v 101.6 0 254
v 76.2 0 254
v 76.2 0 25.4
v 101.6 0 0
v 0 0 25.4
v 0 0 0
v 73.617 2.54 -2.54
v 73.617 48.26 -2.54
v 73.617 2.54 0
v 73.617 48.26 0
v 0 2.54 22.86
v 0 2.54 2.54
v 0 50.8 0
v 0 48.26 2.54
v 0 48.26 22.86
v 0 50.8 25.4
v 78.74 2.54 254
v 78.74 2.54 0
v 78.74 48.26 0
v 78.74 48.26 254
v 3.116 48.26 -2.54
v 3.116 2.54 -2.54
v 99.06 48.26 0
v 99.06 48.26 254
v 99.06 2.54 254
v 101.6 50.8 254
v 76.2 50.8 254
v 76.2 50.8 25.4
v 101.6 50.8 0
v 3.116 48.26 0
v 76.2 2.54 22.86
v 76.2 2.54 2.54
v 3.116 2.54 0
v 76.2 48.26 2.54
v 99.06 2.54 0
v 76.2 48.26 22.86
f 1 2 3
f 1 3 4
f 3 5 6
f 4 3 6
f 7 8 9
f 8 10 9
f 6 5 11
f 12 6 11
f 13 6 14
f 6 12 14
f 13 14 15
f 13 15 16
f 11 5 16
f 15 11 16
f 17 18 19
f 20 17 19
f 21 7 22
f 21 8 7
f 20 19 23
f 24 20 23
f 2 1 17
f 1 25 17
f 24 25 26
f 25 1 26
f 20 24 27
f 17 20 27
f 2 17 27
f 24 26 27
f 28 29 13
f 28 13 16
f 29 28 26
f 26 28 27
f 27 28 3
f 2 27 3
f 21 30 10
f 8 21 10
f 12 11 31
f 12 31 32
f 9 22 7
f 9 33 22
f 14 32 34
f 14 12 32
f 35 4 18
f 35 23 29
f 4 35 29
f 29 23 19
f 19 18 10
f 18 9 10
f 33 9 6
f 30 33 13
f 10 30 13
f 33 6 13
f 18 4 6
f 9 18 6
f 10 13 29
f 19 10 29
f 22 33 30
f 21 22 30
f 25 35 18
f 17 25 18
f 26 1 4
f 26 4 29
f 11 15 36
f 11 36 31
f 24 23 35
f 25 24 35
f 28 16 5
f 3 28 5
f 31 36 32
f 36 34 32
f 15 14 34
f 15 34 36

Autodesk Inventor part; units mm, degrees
ref_plane "YZ Plane" through (0, 0, 0) normal (1, 0, 0) x (0, 1, 0)
ref_plane "XZ Plane" through (0, 0, 0) normal (0, 1, 0) x (-1, 0, 0)
ref_plane "XY Plane" through (0, 0, 0) normal (0, 0, 1) x (1, 0, 0)
sketch "Sketch15" plane through (0, 0, 0) normal (1, 0, 0) x (0, 1, 0)
  line L0 (0, 0) -> (50.8, 0)
  line L1 (50.8, 0) -> (50.8, 25.4)
  line L2 (50.8, 25.4) -> (0, 25.4)
  line L3 (0, 25.4) -> (0, 0)
  line L4 (48.26, 22.86) -> (2.54, 22.86)
  line L5 (2.54, 22.86) -> (2.54, 2.54)
  line L6 (2.54, 2.54) -> (48.26, 2.54)
  line L7 (48.26, 2.54) -> (48.26, 22.86)
  dimension "d46" = 25.4
  dimension "d47" = 50.8
  dimension "d48" = 2.54
  dimension "d49" = 2.54
  dimension "d50" = 2.54
  dimension "d51" = 2.54
extrude "Extrusion12" add sketch "Sketch15" along normal blind 76.2
sketch "Sketch16" plane through (0, 0, 0) normal (0, 0, -1) x (-1, 0, 0)
  line L0 (0, 0) -> (-76.2, 0) projected
  line L1 (-76.2, 0) -> (-101.6, 0)
  line L2 (-101.6, 0) -> (-101.6, 50.8)
  line L3 (-101.6, 50.8) -> (-76.2, 50.8)
  line L4 (-76.2, 50.8) -> (-76.2, 0)
  line L5 (-78.74, 48.26) -> (-99.06, 48.26)
  line L6 (-99.06, 48.26) -> (-99.06, 2.54)
  line L7 (-99.06, 2.54) -> (-78.74, 2.54)
  line L8 (-78.74, 2.54) -> (-78.74, 48.26)
  dimension "d54" = 25.4
  dimension "d55" = 50.8
  dimension "d56" = 2.54
  dimension "d57" = 2.54
  dimension "d58" = 2.54
  dimension "d59" = 2.54
extrude "Extrusion13" add sketch "Sketch16" against normal blind 254
sketch "Sketch17" plane through (0, 0, 0) normal (0, 0, -1) x (-1, 0, 0)
  line L0 (0, 2.54) -> (-76.2, 2.54) projected
  line L1 (0, 48.26) -> (-76.2, 48.26) projected
  line L2 (-73.617, 2.54) -> (-3.1161, 2.54)
  line L3 (-3.1161, 2.54) -> (-3.1161, 48.26)
  line L4 (-3.1161, 48.26) -> (-73.617, 48.26)
  line L5 (-73.617, 48.26) -> (-73.617, 2.54)
  point P0 (0, 0)
extrude "Extrusion14" add sketch "Sketch17" along normal blind 2.54
equation "\"d49\" = d48"
equation "\"d50\" = d48"
equation "\"d51\" = d48"
equation "\"d56\" = d48"
equation "\"d57\" = d48"
equation "\"d58\" = d48"
equation "\"d59\" = d48"
properties part number "right arm"
